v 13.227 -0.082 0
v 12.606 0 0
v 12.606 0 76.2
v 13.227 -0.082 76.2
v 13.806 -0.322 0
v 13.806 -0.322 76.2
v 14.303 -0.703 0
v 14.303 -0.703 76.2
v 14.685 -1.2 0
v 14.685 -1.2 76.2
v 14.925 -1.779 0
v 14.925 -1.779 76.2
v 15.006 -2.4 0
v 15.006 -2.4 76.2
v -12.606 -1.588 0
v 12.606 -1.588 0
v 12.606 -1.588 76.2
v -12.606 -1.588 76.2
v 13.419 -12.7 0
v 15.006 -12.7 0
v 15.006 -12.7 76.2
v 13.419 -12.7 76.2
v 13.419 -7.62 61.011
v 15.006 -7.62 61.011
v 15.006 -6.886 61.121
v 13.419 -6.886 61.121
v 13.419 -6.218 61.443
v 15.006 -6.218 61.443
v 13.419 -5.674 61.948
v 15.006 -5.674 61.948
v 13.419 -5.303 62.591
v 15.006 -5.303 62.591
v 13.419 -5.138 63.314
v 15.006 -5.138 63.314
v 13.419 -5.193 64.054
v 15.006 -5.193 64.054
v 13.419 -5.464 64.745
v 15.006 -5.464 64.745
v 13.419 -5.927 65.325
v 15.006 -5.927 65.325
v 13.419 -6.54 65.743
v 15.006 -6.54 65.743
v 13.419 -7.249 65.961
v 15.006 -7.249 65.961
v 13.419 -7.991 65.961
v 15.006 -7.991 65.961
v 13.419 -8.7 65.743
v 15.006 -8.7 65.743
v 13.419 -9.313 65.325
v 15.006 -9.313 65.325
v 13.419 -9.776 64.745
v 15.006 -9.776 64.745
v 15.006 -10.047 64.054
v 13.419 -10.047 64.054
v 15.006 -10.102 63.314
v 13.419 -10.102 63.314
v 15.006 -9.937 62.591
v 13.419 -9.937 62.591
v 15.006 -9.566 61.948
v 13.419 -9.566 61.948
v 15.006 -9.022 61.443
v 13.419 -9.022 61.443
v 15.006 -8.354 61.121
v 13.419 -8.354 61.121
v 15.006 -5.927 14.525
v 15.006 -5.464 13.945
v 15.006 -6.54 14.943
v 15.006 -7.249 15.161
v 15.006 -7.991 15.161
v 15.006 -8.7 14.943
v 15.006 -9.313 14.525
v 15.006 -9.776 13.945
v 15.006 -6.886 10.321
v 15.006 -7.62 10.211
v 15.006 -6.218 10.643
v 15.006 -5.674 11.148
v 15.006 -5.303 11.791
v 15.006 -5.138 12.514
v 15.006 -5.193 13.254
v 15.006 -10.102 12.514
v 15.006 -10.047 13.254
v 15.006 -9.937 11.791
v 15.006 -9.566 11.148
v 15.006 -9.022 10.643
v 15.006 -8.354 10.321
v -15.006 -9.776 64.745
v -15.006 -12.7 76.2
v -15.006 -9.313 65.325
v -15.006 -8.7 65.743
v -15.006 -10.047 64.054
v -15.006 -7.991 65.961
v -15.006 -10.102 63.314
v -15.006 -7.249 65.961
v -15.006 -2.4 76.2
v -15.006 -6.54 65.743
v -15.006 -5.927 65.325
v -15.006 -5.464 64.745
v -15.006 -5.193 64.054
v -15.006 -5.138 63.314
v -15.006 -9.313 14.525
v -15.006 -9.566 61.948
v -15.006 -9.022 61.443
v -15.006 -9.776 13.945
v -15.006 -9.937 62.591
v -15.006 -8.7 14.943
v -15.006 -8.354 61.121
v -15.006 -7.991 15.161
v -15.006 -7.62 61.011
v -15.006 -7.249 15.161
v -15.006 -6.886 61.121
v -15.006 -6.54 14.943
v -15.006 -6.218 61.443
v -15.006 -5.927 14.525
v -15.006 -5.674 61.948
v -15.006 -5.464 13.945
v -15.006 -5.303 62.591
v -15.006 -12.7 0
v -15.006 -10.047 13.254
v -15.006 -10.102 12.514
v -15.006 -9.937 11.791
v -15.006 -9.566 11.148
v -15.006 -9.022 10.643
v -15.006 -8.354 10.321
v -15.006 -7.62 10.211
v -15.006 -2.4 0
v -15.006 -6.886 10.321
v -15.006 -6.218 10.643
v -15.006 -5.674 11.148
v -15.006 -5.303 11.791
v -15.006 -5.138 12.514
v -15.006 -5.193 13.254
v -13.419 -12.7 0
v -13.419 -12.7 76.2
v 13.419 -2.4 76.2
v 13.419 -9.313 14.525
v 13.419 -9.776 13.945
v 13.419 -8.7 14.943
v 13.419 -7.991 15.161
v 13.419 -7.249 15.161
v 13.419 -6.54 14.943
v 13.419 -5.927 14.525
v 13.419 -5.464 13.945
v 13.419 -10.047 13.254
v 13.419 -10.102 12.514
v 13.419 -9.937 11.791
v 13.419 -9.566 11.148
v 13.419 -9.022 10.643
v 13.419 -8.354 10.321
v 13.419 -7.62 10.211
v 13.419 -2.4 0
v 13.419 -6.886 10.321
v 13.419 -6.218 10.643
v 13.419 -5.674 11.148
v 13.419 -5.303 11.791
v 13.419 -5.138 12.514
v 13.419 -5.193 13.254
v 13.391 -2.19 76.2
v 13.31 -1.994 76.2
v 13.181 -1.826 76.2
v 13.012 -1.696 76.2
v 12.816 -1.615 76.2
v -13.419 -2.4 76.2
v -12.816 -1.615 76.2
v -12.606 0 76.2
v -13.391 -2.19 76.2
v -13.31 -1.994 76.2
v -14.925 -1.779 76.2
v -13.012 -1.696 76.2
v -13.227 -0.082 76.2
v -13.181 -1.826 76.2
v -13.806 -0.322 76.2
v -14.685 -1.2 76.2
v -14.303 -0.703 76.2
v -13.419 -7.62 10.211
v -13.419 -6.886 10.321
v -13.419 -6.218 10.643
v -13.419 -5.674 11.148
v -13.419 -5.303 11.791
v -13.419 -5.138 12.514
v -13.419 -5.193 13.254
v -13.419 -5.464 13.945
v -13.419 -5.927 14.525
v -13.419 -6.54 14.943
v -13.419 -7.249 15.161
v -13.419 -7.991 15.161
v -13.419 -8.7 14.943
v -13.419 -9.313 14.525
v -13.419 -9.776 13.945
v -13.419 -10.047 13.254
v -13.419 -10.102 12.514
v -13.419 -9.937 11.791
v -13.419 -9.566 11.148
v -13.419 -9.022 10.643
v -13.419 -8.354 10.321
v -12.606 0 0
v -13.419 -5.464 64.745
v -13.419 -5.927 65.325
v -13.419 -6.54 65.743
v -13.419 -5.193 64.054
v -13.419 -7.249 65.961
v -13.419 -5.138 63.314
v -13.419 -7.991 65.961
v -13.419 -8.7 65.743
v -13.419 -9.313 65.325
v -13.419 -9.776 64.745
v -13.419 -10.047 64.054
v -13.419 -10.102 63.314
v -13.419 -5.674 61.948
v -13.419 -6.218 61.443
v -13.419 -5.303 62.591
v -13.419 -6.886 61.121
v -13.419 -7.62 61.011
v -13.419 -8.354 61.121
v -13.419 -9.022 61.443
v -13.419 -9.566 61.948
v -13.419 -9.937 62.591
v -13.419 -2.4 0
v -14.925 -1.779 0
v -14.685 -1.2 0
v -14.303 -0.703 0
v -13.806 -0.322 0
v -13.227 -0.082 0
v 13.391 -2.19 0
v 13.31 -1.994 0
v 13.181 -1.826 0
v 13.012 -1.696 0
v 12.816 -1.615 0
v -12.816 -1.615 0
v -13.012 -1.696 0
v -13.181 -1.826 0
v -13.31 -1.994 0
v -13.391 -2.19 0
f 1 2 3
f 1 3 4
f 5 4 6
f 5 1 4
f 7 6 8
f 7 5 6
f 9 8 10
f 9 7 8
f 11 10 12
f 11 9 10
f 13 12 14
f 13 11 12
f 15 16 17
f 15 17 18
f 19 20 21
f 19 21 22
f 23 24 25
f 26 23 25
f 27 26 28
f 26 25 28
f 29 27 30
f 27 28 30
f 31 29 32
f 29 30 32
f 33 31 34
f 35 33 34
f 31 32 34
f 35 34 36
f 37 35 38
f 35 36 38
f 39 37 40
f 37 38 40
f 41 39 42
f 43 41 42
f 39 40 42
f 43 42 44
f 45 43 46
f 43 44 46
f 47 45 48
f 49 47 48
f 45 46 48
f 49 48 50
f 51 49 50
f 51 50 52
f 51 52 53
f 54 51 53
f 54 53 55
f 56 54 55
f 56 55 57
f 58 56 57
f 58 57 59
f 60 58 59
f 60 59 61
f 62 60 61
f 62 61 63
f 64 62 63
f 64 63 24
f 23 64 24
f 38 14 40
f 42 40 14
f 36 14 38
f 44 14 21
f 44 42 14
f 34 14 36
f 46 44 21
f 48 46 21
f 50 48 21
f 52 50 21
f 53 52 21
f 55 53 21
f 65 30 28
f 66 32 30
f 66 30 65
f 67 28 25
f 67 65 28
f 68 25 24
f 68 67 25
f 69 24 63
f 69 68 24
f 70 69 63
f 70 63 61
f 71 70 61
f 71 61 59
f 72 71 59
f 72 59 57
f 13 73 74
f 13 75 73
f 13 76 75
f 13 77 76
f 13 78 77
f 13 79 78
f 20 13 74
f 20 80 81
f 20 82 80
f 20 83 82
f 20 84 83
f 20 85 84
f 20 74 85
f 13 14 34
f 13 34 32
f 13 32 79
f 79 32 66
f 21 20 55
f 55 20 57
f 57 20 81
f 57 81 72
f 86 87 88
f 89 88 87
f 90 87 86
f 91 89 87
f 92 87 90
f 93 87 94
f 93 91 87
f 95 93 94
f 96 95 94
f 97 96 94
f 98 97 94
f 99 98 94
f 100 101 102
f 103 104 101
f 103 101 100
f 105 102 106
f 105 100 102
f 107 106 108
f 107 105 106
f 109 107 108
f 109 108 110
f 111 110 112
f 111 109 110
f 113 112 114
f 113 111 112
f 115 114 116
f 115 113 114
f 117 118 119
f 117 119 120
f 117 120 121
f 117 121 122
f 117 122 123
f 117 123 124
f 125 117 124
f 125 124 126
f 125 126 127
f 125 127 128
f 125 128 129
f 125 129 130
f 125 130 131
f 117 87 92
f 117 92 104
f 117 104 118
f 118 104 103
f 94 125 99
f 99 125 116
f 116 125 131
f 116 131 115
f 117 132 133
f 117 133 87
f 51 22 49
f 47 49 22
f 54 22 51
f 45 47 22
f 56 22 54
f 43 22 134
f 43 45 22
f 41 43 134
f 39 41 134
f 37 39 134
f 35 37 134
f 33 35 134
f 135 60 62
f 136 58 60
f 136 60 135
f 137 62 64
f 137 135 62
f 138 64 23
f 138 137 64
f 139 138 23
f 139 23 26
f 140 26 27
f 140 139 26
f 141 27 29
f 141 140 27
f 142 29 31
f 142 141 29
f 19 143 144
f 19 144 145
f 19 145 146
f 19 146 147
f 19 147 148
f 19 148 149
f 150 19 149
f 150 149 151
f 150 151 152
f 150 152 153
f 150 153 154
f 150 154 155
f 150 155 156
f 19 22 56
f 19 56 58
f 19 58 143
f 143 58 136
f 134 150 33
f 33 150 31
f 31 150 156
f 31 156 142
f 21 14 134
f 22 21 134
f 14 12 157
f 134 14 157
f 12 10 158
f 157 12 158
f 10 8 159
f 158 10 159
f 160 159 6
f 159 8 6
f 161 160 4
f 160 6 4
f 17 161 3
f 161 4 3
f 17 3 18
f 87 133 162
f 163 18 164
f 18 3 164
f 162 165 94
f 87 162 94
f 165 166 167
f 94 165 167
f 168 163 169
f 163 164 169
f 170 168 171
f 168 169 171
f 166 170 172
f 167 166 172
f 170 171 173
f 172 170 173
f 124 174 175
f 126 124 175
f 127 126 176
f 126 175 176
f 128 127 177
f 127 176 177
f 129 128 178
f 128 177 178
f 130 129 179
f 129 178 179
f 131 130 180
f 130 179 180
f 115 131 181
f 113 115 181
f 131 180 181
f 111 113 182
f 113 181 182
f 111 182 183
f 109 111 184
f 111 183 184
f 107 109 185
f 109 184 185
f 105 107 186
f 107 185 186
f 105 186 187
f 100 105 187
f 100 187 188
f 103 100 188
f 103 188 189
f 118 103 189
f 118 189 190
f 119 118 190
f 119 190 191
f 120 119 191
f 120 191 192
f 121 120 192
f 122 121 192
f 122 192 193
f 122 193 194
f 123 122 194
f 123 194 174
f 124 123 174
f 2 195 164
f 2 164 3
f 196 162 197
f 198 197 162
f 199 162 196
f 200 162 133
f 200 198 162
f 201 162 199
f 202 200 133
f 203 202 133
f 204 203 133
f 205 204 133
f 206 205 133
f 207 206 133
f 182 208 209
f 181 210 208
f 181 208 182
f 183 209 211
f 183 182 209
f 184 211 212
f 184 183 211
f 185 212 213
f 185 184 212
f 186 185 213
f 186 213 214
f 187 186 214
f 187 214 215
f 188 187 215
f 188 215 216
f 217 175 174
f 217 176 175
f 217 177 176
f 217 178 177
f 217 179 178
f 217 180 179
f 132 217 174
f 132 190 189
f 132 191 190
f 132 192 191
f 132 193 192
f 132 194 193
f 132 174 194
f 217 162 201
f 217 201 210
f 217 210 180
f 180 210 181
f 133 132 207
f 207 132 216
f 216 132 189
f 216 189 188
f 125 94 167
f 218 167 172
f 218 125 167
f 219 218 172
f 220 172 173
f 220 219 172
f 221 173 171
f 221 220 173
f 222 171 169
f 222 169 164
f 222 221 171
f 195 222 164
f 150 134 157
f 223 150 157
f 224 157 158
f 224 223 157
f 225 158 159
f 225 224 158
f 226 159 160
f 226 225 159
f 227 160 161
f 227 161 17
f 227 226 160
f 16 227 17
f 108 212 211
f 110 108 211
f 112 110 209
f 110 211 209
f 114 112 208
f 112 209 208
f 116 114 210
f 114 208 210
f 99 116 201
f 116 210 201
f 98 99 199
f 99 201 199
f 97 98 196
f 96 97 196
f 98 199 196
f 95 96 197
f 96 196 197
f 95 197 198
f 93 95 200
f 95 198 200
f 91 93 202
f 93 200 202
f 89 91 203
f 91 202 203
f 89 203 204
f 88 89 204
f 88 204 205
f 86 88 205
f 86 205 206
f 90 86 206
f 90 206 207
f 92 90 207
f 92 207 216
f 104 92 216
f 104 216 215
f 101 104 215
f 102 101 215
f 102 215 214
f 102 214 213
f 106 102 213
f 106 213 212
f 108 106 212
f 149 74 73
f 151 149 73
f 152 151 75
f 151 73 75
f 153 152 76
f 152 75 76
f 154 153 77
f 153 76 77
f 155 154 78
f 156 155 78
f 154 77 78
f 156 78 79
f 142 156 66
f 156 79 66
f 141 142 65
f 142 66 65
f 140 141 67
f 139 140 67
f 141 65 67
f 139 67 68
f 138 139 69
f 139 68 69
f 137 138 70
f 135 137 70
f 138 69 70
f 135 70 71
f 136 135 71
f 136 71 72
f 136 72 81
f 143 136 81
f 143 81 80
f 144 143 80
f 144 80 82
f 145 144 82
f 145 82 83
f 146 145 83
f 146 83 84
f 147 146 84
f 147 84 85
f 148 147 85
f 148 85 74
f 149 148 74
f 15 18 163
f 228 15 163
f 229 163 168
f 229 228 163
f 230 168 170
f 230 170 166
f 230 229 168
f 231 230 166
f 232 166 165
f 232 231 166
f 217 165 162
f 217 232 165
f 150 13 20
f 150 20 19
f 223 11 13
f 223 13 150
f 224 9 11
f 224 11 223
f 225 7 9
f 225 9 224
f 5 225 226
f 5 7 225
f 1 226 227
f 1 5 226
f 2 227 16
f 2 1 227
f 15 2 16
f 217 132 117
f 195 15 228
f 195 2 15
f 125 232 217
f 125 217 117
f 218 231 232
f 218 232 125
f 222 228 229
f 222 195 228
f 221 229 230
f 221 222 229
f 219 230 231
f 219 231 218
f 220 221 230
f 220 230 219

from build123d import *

# Parameters (mm, degrees)
BASE_FLANGE1_DEPTH = 76.2
SKETCH2_R          = 2.4892
CUT_EXTRUDE1_DEPTH = 83.876344995


# Sheet-metal steps are written as plain solids
with BuildPart() as part:
    # Sketch1 → Base-Flange1 (new body)
    with BuildSketch(Plane.XY):
        with BuildLine():
            Line((-15.00632, -12.7), (-15.00632, -2.4003))
            ThreePointArc((-15.00632, -2.4003), (-14.303288407, -0.703031593), (-12.60602, 0))
            Line((-12.60602, 0), (12.60602, 0))
            ThreePointArc((12.60602, 0), (14.303288407, -0.703031593), (15.00632, -2.4003))
            Line((15.00632, -2.4003), (15.00632, -12.7))
            Line((15.00632, -12.7), (13.41882, -12.7))
            Line((13.41882, -12.7), (13.41882, -2.4003))
            ThreePointArc((13.41882, -2.4003), (13.180756392, -1.825563608), (12.60602, -1.5875))
            Line((12.60602, -1.5875), (-12.60602, -1.5875))
            ThreePointArc((-12.60602, -1.5875), (-13.180756392, -1.825563608), (-13.41882, -2.4003))
            Line((-13.41882, -2.4003), (-13.41882, -12.7))
            Line((-13.41882, -12.7), (-15.00632, -12.7))
        make_face()
    extrude(amount=BASE_FLANGE1_DEPTH)

    # Sketch2 → Cut-Extrude1 (cut, through all)
    with BuildSketch(Plane(origin=(15.00632, 0, 0), x_dir=(0, 0, -1), z_dir=(1, 0, 0))):
        with Locations((-63.5, -7.62)):
            Circle(SKETCH2_R)
        with Locations((-12.7, -7.62)):
            Circle(SKETCH2_R)
    extrude(amount=-CUT_EXTRUDE1_DEPTH, mode=Mode.SUBTRACT)


solid = part.part
